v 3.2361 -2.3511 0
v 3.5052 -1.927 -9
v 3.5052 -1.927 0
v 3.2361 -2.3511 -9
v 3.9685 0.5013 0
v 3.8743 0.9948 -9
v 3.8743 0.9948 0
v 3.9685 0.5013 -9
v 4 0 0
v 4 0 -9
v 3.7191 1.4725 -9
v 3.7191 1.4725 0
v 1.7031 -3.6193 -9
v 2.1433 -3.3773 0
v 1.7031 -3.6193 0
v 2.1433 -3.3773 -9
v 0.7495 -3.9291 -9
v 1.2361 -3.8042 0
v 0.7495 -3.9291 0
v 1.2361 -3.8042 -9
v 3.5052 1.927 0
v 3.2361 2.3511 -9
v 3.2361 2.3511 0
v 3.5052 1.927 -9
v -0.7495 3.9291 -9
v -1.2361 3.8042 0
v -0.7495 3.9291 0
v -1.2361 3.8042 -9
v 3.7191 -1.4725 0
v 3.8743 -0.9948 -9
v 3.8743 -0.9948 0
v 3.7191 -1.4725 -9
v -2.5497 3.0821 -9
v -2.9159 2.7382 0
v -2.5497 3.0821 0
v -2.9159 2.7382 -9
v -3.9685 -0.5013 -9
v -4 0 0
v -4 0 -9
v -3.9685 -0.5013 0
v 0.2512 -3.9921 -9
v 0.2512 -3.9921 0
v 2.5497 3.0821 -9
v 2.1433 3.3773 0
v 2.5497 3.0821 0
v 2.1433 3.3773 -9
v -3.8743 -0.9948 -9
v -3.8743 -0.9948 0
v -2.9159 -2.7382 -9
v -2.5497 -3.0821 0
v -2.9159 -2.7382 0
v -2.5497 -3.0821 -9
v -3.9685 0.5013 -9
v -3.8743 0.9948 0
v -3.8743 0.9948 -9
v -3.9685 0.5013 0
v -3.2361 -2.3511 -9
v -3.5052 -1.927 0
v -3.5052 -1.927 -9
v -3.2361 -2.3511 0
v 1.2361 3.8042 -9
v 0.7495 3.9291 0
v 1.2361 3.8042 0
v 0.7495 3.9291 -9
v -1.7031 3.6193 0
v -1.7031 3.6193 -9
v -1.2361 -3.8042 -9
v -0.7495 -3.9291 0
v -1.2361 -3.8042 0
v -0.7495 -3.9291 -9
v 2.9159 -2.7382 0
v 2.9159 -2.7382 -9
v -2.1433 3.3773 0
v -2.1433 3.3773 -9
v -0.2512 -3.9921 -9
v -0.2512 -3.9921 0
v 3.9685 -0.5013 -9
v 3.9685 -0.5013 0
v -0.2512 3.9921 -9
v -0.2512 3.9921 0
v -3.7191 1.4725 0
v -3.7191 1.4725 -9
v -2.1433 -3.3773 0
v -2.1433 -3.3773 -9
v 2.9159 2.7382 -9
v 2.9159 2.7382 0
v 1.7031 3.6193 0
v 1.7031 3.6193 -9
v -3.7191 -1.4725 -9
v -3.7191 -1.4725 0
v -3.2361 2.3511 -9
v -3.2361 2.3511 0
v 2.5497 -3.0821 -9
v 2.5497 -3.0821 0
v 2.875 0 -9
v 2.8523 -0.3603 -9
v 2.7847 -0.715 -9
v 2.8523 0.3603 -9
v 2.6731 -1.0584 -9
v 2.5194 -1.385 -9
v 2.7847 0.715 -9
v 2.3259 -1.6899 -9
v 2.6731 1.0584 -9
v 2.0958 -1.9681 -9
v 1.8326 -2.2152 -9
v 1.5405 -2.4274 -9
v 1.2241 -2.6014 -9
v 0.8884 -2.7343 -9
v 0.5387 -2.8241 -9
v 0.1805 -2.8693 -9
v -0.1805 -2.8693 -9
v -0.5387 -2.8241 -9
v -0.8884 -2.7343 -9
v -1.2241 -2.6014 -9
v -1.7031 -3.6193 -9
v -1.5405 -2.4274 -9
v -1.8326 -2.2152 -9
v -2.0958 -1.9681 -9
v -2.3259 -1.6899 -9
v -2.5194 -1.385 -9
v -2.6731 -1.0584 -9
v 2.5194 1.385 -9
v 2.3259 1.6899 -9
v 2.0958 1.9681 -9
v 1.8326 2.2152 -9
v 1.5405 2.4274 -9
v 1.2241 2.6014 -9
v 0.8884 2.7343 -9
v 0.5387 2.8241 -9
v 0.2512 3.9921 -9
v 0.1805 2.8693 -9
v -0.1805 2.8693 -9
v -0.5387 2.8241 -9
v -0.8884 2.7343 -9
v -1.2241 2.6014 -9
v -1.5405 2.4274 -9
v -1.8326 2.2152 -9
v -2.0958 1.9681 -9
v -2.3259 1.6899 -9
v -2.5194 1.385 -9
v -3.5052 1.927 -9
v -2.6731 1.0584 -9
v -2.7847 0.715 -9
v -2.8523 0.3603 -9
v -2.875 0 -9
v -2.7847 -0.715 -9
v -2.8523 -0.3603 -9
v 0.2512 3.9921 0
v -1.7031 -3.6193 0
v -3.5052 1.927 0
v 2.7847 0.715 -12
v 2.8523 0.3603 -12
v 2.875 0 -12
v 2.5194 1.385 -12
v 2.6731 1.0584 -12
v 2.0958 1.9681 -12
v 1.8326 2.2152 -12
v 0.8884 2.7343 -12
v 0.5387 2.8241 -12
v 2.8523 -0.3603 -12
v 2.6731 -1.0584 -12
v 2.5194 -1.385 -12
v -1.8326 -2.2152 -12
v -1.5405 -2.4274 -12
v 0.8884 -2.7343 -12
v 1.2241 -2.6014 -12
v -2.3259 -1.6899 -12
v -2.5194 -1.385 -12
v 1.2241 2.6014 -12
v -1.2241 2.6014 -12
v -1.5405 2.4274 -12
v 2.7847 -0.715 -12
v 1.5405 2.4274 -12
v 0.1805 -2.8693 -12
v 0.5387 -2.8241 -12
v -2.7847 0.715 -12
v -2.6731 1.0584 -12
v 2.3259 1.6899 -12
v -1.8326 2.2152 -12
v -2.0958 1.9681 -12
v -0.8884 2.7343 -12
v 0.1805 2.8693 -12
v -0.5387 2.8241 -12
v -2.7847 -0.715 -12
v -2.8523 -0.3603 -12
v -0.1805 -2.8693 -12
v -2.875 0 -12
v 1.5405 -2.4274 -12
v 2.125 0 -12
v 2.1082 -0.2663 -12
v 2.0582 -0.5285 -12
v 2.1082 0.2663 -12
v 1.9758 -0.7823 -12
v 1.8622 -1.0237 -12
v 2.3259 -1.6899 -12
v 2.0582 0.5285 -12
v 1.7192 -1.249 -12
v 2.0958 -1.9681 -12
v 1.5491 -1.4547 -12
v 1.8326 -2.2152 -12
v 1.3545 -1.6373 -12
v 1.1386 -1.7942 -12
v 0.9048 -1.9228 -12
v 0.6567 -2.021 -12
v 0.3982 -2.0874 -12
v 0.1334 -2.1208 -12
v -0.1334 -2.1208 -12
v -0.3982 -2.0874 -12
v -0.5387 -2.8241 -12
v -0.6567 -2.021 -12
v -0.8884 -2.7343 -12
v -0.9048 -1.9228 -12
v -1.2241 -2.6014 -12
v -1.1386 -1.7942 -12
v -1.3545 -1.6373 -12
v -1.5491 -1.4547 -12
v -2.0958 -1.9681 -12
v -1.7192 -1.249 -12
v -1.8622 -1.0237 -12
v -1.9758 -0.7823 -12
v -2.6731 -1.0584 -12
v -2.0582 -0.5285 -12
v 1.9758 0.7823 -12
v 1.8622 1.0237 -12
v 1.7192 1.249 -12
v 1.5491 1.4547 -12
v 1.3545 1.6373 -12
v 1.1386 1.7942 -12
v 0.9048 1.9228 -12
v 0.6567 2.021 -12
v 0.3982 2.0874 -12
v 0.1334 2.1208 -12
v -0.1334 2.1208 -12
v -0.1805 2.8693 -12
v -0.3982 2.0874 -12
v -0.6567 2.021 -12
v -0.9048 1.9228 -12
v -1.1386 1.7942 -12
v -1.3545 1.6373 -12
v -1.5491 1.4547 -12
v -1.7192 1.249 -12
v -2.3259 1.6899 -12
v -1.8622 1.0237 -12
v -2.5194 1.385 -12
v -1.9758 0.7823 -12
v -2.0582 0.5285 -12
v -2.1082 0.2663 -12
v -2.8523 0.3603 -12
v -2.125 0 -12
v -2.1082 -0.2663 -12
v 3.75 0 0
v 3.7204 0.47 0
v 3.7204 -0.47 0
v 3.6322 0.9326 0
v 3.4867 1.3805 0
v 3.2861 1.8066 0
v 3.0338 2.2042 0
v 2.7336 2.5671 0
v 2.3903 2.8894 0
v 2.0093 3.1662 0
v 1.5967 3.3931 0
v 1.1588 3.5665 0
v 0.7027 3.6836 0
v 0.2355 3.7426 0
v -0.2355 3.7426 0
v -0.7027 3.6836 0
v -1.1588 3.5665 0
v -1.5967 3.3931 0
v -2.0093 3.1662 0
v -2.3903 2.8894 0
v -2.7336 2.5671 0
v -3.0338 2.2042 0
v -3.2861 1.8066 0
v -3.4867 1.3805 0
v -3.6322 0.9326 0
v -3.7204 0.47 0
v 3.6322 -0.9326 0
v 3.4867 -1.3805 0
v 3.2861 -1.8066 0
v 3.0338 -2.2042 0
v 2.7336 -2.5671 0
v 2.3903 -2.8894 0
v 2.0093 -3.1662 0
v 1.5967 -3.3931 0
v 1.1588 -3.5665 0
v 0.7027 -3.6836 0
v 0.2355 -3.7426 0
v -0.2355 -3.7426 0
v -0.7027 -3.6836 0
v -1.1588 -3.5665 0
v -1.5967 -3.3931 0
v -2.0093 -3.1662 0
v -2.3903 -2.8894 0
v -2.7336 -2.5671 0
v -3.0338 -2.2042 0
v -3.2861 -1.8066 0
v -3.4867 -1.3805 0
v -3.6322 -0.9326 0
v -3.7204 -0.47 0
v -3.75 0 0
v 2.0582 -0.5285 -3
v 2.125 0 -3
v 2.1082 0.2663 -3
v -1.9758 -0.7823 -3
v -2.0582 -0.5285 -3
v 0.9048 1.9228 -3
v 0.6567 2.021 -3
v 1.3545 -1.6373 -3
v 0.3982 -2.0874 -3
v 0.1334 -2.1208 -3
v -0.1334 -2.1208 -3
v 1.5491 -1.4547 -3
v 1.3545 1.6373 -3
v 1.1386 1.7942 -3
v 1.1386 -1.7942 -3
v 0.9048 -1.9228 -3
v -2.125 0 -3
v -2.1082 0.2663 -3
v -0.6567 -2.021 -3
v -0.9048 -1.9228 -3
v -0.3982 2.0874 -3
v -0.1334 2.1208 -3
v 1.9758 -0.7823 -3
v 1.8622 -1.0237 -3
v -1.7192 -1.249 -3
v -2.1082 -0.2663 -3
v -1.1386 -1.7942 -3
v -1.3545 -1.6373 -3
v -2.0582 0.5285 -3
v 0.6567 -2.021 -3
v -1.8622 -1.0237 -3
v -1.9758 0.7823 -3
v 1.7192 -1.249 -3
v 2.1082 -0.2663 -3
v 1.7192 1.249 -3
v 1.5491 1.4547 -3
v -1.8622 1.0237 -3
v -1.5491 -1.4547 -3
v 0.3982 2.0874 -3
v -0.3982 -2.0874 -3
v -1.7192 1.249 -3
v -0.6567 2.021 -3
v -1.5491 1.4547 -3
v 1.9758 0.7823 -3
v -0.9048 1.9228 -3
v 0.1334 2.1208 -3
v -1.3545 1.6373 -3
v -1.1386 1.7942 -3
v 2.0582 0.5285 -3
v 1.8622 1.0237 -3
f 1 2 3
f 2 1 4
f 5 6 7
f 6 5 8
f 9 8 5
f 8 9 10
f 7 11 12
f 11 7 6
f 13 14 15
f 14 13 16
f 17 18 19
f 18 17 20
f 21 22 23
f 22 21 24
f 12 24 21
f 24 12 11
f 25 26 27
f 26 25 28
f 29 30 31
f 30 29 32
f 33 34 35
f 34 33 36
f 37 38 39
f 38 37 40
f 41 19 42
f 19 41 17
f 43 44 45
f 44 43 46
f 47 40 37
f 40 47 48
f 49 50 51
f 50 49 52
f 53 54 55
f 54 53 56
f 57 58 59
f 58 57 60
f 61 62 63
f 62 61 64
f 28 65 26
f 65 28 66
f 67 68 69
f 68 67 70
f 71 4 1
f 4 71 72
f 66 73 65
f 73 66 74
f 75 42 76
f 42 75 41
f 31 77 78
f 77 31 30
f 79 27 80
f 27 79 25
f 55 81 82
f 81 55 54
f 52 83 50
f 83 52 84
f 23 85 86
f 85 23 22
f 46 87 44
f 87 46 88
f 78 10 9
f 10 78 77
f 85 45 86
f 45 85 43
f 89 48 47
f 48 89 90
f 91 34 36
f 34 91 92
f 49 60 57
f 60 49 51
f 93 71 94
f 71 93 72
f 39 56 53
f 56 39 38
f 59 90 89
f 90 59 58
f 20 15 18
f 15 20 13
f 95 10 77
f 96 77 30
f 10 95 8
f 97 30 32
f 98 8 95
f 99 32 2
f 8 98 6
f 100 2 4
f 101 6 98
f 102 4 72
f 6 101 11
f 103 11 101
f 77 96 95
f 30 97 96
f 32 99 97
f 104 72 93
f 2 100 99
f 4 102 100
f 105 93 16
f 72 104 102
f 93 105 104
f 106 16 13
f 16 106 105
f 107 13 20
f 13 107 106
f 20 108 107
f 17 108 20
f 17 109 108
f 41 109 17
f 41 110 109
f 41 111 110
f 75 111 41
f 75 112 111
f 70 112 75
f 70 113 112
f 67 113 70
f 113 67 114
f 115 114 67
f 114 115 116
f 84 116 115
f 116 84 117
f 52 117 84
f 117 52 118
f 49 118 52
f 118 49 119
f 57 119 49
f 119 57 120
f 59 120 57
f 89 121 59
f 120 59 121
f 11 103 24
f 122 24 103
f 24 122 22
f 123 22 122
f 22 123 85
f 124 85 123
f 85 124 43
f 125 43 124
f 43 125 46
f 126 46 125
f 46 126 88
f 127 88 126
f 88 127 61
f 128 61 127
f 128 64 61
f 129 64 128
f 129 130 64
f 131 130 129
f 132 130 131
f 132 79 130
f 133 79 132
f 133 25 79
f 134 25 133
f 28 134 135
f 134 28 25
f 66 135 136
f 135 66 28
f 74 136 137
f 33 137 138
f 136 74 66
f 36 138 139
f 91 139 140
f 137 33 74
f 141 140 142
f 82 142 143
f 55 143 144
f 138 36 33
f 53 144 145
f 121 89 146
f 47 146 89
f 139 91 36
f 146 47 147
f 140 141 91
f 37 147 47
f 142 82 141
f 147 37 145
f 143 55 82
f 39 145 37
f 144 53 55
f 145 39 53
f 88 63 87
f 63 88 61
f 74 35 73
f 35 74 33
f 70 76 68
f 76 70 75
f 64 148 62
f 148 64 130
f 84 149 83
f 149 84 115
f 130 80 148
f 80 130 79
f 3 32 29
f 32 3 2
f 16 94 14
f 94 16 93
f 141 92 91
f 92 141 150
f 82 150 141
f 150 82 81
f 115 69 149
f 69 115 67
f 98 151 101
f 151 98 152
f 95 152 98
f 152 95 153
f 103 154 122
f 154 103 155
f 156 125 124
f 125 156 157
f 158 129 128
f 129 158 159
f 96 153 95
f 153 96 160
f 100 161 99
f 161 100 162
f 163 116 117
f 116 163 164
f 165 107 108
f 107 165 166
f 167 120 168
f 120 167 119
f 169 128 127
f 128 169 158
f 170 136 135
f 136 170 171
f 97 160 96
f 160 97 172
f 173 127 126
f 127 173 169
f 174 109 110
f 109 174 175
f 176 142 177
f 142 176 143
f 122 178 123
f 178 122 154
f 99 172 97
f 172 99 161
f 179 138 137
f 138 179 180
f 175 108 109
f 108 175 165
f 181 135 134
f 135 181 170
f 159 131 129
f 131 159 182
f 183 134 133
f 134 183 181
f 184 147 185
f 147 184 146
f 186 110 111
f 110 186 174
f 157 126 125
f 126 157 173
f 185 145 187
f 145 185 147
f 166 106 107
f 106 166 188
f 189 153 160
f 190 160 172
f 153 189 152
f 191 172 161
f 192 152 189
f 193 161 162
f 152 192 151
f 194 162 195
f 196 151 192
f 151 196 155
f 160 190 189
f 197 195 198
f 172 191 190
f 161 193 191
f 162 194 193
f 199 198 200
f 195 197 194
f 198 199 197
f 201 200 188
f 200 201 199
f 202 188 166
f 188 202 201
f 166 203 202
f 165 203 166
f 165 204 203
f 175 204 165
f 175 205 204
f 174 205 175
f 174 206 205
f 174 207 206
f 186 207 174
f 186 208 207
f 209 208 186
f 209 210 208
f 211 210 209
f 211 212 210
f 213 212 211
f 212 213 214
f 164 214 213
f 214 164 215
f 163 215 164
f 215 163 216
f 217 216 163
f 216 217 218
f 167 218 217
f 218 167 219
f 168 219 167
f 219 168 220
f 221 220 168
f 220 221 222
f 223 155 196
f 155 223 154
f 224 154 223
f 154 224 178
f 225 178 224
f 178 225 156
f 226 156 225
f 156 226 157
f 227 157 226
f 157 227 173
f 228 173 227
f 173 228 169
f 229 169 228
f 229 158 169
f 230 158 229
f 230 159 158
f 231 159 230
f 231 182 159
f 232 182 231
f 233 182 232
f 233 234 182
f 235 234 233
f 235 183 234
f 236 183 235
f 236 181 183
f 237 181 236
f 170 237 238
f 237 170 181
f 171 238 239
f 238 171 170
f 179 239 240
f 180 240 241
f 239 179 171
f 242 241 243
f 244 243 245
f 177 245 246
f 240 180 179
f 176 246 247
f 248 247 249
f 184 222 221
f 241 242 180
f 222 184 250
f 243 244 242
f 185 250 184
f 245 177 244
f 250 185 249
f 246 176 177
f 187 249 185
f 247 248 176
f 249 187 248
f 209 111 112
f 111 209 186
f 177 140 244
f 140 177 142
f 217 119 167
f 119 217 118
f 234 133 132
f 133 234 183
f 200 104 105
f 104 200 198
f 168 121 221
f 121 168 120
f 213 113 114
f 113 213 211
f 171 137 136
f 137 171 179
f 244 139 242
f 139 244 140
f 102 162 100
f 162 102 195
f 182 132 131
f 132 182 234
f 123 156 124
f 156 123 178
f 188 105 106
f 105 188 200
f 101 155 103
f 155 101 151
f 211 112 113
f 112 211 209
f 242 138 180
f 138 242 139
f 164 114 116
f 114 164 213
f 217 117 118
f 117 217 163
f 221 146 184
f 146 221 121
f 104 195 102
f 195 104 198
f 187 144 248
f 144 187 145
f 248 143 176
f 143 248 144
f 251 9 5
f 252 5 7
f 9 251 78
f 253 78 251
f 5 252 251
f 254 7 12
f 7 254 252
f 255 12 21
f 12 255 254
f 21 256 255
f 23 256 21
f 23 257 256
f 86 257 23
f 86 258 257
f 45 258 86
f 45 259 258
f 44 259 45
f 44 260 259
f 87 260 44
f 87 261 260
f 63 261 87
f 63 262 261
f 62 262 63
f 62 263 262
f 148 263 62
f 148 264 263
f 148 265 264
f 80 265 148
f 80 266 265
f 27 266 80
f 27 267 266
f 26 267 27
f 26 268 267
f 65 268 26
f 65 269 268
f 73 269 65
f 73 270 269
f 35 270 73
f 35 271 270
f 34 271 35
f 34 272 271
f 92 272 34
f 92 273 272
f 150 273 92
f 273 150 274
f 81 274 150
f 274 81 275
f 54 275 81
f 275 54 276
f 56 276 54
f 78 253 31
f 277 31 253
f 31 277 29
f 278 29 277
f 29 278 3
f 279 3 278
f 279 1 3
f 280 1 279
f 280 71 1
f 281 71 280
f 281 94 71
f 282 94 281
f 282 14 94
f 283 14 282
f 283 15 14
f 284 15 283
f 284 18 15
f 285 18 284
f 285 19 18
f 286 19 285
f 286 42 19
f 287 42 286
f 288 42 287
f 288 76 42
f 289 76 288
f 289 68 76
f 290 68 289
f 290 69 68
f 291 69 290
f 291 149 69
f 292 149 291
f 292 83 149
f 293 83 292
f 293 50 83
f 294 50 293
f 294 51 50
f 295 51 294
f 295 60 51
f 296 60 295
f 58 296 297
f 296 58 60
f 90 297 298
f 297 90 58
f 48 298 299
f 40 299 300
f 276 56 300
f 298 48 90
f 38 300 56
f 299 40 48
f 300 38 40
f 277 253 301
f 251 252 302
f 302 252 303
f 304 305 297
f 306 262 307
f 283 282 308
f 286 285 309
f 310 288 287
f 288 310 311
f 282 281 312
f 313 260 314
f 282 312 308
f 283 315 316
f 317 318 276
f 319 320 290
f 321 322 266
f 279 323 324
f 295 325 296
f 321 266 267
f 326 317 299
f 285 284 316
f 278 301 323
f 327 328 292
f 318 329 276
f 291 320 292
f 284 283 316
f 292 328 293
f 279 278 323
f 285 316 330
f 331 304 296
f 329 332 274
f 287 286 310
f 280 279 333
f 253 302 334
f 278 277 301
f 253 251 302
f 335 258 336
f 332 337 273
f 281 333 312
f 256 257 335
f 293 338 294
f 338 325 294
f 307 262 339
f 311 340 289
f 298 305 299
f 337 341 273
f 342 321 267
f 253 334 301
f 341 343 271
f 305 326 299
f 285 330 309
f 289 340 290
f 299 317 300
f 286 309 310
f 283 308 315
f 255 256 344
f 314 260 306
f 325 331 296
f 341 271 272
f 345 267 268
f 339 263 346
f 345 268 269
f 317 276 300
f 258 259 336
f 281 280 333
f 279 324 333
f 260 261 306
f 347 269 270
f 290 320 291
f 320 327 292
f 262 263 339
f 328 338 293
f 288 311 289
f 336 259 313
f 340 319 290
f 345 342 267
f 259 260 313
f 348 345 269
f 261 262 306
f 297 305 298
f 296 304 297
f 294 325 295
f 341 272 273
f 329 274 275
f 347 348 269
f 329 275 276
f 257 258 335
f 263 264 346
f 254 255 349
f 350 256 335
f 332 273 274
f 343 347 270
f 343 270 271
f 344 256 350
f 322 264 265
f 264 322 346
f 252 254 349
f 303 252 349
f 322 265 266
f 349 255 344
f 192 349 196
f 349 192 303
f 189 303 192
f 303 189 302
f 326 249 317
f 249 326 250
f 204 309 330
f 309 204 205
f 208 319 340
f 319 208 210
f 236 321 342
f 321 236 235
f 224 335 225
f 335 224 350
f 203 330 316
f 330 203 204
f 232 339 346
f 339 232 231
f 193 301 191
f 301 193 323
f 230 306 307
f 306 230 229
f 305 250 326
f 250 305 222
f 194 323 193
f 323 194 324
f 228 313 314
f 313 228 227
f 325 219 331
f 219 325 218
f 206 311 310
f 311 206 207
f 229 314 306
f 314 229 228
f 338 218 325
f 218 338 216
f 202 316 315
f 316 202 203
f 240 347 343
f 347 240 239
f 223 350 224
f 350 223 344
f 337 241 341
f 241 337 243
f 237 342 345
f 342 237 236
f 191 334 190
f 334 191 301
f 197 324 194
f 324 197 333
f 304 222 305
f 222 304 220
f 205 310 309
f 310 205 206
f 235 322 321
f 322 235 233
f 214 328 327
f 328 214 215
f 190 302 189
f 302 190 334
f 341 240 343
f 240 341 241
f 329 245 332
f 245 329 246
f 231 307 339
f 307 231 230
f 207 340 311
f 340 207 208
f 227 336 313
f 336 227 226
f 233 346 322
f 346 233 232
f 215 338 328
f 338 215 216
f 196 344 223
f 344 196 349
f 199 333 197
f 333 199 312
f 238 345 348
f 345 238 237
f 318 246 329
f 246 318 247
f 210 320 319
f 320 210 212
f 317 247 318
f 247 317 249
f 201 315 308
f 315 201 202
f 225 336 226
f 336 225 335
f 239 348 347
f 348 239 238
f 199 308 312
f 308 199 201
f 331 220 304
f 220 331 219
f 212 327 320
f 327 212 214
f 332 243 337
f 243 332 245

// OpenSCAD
$fn = 50;

difference() {
	union() {
		translate(v = [0, 0, -9.0]) {
			cylinder(h = 12, r = 4.0);
		}
		#translate(v = [0, 0, -12.0]) {
			cylinder(h = 12, r = 2.875);
		}
	}
	union() {
		translate(v = [0, 0, 0]) {
			rotate(a = [0, 0, 0]) {
				difference() {
					union() {
						translate(v = [0, 0, -12.0]) {
							cylinder(h = 12, r = 2.0);
						}
						translate(v = [0, 0, -3]) {
							cylinder(h = 3, r1 = 2.125, r2 = 3.75);
						}
						translate(v = [0, 0, -12.0]) {
							cylinder(h = 12, r = 2.125);
						}
						translate(v = [0, 0, -12.0]) {
							cylinder(h = 12, r = 2.0);
						}
					}
					union();
				}
			}
		}
		#cylinder(h = 3, r = 5.0);
	}
}
